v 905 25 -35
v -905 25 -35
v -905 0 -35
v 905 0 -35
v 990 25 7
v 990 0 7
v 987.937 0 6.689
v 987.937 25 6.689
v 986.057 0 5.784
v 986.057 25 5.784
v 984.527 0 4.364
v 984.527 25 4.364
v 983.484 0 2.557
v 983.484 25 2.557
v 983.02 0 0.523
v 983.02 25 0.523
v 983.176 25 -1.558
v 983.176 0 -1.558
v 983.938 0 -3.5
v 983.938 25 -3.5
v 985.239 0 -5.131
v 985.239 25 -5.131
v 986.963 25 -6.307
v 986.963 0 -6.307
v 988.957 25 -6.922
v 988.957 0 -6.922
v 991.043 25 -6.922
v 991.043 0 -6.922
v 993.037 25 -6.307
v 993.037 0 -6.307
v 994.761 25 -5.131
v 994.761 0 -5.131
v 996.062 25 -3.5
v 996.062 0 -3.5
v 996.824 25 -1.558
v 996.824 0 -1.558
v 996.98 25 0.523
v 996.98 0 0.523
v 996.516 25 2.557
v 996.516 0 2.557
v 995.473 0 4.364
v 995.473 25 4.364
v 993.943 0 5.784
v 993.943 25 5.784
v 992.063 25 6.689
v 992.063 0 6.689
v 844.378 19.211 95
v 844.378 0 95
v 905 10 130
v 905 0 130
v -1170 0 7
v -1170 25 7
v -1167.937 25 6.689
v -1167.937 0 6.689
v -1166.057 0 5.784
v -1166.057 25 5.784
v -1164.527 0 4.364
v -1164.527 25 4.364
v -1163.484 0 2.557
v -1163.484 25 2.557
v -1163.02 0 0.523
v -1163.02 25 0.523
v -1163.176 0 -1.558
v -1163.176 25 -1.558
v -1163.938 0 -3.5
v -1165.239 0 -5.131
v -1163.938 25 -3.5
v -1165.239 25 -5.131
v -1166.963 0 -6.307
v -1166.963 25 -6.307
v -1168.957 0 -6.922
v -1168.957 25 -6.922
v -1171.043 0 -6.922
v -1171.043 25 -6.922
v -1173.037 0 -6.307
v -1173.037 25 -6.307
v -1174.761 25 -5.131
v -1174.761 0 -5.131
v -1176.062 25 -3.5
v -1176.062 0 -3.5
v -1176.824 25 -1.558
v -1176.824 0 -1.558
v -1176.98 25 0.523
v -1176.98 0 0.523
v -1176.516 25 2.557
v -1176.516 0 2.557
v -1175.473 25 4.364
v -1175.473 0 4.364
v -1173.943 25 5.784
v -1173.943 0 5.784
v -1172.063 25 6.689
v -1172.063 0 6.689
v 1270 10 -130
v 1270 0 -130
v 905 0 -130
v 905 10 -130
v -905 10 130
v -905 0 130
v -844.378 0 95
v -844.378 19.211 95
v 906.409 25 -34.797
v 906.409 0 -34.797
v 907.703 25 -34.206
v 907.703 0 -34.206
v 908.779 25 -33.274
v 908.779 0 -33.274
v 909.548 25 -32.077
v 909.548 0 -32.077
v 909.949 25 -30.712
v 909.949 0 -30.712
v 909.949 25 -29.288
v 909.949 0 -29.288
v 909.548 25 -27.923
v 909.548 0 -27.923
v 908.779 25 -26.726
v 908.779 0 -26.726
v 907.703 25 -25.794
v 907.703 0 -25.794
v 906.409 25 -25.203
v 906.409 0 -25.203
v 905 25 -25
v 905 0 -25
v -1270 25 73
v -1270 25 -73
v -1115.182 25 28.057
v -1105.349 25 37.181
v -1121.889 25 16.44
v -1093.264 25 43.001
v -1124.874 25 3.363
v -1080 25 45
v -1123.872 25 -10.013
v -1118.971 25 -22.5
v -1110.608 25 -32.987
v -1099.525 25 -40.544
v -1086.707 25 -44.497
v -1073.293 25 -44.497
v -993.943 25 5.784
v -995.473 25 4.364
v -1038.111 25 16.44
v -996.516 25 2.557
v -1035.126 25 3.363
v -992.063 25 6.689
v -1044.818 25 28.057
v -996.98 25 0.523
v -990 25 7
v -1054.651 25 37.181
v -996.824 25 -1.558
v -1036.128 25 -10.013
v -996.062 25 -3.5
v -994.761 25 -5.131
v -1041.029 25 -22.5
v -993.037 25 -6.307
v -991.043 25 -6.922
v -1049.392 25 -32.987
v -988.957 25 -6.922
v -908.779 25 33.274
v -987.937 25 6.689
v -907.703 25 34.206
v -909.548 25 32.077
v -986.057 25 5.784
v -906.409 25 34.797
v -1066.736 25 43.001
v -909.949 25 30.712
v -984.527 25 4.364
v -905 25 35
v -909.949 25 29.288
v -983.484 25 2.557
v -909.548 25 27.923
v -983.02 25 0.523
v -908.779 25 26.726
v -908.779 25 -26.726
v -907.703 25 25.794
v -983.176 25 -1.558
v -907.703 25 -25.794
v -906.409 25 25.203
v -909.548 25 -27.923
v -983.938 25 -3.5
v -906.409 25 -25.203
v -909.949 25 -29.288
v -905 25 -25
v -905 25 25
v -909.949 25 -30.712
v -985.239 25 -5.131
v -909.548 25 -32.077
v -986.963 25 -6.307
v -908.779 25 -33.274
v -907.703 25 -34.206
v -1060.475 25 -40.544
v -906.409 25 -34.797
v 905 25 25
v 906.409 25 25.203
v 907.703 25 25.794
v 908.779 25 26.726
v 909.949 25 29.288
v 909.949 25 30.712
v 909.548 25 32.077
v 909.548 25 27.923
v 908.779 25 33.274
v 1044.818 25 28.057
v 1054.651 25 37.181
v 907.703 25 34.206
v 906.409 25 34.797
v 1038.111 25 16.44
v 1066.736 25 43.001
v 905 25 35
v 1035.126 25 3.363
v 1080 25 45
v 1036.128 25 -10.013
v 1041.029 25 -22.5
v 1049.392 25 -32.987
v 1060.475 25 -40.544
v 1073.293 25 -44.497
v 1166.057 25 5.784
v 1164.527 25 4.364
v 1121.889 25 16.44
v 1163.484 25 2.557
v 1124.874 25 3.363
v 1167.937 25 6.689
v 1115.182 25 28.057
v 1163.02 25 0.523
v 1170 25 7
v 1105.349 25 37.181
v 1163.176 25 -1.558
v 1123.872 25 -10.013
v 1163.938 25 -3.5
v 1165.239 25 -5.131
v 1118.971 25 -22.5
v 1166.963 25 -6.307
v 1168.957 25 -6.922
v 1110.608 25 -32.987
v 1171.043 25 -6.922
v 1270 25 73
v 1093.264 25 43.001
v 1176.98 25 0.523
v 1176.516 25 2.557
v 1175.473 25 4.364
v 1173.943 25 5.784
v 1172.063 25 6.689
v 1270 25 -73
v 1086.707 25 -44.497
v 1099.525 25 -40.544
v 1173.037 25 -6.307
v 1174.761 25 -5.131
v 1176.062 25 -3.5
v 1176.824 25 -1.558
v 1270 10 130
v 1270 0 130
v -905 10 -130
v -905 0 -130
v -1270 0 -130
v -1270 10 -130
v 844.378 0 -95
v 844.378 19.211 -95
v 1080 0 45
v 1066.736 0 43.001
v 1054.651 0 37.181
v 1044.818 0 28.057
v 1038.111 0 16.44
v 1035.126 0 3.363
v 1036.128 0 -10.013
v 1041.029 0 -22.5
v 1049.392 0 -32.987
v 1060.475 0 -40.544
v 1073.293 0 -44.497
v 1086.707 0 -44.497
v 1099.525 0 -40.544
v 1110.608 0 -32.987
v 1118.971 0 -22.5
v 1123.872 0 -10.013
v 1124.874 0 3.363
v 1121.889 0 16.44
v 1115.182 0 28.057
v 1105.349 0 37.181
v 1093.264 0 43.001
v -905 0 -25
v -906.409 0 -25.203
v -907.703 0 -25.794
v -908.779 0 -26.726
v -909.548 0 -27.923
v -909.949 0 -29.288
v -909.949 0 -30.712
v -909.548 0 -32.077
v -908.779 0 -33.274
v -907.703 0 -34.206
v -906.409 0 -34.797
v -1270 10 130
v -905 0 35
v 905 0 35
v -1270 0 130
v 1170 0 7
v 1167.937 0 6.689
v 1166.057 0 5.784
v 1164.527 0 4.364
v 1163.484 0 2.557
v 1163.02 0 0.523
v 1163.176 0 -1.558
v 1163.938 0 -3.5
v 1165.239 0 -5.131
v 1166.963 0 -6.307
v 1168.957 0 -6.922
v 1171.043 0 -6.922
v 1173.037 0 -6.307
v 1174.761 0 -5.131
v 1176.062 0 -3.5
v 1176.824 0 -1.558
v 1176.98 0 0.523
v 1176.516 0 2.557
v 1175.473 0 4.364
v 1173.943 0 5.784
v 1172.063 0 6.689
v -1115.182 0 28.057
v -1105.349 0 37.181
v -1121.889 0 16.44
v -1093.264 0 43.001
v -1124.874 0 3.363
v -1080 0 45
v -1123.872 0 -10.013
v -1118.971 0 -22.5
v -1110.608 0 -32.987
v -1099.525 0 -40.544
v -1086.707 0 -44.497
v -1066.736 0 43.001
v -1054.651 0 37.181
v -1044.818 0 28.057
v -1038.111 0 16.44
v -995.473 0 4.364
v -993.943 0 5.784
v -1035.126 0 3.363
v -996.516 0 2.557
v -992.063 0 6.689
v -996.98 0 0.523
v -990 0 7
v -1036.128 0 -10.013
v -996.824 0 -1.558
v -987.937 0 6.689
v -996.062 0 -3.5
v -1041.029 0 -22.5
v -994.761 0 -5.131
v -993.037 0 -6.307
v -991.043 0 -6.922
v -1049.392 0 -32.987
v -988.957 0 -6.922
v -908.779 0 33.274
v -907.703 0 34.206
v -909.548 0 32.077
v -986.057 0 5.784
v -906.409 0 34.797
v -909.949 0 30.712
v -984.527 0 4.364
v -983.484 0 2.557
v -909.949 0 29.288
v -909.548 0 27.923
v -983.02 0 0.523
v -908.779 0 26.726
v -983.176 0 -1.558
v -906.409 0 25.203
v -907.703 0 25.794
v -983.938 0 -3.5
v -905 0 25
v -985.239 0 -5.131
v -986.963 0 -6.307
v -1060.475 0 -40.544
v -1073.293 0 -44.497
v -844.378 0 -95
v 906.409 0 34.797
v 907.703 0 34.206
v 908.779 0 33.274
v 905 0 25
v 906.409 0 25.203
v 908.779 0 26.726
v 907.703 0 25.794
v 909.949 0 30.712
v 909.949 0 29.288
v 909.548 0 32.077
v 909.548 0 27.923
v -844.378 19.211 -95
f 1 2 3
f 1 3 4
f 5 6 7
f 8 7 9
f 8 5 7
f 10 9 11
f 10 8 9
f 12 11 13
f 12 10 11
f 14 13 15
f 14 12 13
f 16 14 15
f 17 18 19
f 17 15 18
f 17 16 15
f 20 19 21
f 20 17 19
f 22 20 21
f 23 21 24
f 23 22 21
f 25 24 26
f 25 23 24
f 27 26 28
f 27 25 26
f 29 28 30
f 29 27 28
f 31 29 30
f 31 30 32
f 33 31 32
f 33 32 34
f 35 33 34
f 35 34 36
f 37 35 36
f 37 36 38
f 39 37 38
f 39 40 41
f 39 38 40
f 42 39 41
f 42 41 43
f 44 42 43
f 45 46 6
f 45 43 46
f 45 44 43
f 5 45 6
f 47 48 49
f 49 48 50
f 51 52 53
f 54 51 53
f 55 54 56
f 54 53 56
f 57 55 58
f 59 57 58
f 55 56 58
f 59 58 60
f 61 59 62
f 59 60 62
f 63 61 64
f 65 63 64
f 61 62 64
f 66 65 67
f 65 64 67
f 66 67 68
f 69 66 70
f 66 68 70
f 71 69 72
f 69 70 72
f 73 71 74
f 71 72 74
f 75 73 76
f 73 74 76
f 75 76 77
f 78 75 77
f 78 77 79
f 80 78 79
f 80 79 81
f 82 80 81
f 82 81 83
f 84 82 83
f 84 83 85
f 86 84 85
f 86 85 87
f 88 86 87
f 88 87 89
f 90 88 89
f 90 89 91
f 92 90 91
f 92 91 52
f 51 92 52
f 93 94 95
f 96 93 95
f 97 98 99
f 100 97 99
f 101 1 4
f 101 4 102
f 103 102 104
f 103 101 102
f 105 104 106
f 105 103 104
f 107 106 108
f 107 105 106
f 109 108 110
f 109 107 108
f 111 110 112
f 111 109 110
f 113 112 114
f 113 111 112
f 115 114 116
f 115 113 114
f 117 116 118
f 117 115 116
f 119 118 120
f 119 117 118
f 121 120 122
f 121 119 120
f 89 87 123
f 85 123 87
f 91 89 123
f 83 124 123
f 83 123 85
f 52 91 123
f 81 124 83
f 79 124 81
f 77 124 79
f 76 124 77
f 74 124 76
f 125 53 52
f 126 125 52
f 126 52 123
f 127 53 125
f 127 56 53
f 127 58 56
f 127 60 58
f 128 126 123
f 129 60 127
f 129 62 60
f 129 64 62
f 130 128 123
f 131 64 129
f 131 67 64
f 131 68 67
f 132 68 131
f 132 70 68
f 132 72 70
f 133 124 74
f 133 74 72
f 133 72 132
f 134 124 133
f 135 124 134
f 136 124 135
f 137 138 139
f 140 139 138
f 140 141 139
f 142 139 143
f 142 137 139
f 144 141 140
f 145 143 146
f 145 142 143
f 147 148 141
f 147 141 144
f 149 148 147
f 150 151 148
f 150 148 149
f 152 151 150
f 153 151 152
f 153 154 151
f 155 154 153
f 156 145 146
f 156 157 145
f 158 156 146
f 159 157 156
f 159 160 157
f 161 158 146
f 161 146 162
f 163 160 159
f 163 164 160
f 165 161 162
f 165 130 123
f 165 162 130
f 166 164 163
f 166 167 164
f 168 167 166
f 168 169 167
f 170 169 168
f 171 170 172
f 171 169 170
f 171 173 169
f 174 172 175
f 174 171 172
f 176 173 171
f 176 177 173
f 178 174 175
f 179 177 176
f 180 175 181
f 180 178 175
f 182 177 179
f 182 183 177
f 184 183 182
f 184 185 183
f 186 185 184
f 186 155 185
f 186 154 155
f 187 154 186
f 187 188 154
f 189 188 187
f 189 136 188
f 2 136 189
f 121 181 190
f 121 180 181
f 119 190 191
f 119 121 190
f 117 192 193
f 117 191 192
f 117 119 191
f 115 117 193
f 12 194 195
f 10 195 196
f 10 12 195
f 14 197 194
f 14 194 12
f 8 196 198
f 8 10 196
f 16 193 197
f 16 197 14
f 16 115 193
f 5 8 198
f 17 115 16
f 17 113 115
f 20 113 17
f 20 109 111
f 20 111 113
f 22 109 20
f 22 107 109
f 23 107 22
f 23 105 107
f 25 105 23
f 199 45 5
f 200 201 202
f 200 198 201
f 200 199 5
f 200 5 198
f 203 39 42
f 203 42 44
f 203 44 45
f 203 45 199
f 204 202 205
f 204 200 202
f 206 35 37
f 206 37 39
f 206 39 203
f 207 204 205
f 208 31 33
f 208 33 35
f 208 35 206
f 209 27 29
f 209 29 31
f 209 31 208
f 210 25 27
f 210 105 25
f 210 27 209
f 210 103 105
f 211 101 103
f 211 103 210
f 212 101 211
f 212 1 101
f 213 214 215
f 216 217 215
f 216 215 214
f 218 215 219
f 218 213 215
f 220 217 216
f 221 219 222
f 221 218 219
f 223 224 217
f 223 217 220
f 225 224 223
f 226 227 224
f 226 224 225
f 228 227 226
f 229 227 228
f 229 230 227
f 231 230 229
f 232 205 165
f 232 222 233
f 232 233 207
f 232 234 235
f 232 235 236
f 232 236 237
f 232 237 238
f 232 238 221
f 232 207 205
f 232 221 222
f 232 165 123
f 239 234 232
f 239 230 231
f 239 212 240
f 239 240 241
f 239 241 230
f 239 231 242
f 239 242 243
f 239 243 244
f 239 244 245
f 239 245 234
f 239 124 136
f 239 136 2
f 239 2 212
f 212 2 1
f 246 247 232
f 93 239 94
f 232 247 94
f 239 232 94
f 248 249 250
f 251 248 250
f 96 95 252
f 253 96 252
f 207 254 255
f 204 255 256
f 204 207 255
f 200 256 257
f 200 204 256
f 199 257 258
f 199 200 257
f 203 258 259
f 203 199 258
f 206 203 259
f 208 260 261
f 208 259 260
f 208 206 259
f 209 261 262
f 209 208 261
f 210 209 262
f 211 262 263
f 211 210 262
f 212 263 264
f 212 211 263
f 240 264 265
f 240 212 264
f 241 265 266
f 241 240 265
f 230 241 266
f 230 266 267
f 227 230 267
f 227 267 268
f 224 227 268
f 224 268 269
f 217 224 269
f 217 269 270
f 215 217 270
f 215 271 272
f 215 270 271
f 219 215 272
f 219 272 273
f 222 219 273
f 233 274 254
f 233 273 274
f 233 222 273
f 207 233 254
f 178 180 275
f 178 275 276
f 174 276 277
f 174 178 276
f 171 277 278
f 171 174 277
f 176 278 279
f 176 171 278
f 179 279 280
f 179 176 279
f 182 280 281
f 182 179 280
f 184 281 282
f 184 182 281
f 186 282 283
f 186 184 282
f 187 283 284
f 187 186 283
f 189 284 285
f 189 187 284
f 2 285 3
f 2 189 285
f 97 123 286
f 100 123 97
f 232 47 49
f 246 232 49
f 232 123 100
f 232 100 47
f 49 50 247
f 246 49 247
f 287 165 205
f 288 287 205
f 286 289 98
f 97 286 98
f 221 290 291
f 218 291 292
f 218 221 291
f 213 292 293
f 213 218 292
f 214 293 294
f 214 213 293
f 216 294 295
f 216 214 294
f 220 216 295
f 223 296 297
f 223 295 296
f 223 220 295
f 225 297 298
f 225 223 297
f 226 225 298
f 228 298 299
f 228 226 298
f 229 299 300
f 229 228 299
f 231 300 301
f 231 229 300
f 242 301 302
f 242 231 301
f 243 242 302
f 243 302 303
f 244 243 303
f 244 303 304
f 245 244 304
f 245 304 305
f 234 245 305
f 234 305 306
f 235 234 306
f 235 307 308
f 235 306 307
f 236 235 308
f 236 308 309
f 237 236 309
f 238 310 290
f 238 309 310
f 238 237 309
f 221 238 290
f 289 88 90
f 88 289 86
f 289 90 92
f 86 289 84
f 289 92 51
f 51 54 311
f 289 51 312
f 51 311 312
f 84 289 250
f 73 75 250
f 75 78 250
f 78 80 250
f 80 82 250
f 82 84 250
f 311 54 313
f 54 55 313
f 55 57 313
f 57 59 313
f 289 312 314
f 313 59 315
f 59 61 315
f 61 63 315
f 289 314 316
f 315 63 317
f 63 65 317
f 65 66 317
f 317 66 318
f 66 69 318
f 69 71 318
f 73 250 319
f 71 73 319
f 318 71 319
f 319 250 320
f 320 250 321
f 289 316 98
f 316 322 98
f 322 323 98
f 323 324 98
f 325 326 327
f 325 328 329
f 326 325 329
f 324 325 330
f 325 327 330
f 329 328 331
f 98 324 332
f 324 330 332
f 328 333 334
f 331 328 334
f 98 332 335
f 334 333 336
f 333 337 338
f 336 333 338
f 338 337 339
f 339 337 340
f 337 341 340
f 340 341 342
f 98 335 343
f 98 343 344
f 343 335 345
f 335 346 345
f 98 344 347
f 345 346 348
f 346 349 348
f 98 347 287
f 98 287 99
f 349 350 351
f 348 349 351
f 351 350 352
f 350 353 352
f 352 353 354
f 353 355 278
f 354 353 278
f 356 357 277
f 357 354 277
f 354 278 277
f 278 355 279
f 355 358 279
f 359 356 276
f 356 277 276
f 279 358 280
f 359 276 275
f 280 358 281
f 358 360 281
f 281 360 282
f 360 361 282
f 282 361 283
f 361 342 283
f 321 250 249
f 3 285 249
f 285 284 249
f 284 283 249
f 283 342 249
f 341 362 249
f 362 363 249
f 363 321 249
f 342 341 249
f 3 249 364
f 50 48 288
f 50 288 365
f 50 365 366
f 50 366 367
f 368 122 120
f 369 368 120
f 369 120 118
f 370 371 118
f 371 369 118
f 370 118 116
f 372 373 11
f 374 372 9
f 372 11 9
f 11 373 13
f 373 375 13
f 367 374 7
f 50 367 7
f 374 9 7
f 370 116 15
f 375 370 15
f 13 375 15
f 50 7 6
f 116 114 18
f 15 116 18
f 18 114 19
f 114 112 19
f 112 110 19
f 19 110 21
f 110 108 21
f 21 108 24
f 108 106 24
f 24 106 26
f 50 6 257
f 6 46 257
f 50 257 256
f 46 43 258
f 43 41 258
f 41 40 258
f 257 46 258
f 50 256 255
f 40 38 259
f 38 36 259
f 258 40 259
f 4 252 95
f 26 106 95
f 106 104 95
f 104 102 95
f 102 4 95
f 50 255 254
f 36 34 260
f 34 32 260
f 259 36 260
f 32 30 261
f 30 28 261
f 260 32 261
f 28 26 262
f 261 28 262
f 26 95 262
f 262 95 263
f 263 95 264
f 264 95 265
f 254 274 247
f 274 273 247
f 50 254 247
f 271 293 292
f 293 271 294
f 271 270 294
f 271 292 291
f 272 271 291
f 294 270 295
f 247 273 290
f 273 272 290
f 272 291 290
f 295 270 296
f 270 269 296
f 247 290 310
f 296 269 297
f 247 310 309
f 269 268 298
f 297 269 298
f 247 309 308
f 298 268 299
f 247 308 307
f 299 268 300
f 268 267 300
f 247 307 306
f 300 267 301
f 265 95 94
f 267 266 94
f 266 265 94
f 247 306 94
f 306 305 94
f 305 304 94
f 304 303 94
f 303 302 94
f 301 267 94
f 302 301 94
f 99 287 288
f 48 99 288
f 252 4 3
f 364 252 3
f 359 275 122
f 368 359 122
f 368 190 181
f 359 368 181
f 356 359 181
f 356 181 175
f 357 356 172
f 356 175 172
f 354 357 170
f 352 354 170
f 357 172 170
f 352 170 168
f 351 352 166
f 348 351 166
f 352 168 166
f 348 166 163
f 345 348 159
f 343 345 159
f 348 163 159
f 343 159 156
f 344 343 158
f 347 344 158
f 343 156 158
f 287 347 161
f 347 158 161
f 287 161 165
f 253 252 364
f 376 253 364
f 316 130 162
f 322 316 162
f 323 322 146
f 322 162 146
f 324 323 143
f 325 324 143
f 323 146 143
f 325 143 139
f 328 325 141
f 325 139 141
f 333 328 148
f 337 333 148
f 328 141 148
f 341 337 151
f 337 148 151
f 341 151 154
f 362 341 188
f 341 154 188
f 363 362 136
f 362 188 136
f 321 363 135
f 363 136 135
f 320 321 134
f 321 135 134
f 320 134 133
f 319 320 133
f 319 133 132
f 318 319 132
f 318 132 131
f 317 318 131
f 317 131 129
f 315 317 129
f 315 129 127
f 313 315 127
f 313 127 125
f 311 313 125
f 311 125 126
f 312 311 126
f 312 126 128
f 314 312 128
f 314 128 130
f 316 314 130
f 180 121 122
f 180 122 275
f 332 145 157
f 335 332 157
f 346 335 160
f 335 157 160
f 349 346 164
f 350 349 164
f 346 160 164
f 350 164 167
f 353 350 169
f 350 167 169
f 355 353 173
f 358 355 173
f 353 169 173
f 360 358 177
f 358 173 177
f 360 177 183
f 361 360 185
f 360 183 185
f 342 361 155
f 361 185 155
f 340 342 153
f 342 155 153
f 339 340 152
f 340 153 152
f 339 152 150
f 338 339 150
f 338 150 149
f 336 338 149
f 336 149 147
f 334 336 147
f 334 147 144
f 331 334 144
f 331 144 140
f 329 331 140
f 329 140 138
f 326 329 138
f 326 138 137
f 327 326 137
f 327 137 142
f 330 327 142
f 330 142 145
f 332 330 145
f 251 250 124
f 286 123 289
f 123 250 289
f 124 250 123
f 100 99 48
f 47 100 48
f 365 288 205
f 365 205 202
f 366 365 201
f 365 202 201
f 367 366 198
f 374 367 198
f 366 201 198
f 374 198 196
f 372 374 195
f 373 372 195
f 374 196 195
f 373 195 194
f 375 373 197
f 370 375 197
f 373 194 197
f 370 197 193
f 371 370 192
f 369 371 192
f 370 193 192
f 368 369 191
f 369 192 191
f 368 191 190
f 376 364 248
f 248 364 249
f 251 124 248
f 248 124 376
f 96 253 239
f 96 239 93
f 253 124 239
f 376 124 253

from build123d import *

# Parameters (mm, degrees)
EXTRUDE_1_DEPTH     = 25
SKETCH_2_R          = 45
SKETCH_2_R_2        = 7
CUT_EXTRUDE_1_DEPTH = 1277.880965478
CUT_EXTRUDE_2_DEPTH = 1277.880965478
CUT_EXTRUDE_3_DEPTH = 2544.447463582


with BuildPart() as part:
    # 草图1 → 凸台-拉伸1 (new body)
    with BuildSketch(Plane(origin=(0, 0, 0), x_dir=(1, 0, 0), z_dir=(0, 1, 0))):
        Polygon((-1270, 130), (-1270, -130), (-905, -130), (-844.378221735, -95), (844.378221735, -95), (905, -130), (1270, -130), (1270, 130), (905, 130), (844.378221735, 95), (-844.378221735, 95), (-905, 130), align=None)
    extrude(amount=EXTRUDE_1_DEPTH)

    # 草图2 → 切除-拉伸1 (cut, through all)
    with BuildSketch(Plane(origin=(0, 25, 0), x_dir=(1, 0, 0), z_dir=(0, 1, 0))):
        with Locations(Location((-1080, 0, 0), (0, 0, 270))):
            Circle(SKETCH_2_R)
        with Locations(Location((-1170, 0, 0), (0, 0, 270))):
            Circle(SKETCH_2_R_2)
        with Locations(Location((-990, 0, 0), (0, 0, 270))):
            Circle(SKETCH_2_R_2)
    cut_extrude_1 = extrude(amount=-CUT_EXTRUDE_1_DEPTH, mode=Mode.SUBTRACT)

    # 镜向1: 切除-拉伸1 across plane
    add(cut_extrude_1.mirror(Plane(origin=(0, 0, 0), x_dir=(0, 0, 1), z_dir=(1, 0, 0))), mode=Mode.SUBTRACT)

    # 草图3 → 切除-拉伸2 (cut, through all)
    with BuildSketch(Plane(origin=(0, 25, 0), x_dir=(1, 0, 0), z_dir=(0, 1, 0))):
        with BuildLine():
            Line((-905, -35), (905, -35))
            ThreePointArc((905, -35), (910, -30), (905, -25))
            Line((905, -25), (-905, -25))
            ThreePointArc((-905, -25), (-910, -30), (-905, -35))
        make_face()
    cut_extrude_2 = extrude(amount=-CUT_EXTRUDE_2_DEPTH, mode=Mode.SUBTRACT)

    # 镜向2: 切除-拉伸2 across plane
    add(cut_extrude_2.mirror(Plane.XY), mode=Mode.SUBTRACT)

    # 草图6 → 切除-拉伸3 (cut, through all)
    with BuildSketch(Plane(origin=(1270, 0, 0), x_dir=(0, 0, -1), z_dir=(1, 0, 0))):
        Polygon((-73, 25), (-130, 10), (-130, 25), align=None)
        Polygon((73, 25), (130, 10), (130, 25), align=None)
    extrude(amount=-CUT_EXTRUDE_3_DEPTH, mode=Mode.SUBTRACT)


solid = part.part
